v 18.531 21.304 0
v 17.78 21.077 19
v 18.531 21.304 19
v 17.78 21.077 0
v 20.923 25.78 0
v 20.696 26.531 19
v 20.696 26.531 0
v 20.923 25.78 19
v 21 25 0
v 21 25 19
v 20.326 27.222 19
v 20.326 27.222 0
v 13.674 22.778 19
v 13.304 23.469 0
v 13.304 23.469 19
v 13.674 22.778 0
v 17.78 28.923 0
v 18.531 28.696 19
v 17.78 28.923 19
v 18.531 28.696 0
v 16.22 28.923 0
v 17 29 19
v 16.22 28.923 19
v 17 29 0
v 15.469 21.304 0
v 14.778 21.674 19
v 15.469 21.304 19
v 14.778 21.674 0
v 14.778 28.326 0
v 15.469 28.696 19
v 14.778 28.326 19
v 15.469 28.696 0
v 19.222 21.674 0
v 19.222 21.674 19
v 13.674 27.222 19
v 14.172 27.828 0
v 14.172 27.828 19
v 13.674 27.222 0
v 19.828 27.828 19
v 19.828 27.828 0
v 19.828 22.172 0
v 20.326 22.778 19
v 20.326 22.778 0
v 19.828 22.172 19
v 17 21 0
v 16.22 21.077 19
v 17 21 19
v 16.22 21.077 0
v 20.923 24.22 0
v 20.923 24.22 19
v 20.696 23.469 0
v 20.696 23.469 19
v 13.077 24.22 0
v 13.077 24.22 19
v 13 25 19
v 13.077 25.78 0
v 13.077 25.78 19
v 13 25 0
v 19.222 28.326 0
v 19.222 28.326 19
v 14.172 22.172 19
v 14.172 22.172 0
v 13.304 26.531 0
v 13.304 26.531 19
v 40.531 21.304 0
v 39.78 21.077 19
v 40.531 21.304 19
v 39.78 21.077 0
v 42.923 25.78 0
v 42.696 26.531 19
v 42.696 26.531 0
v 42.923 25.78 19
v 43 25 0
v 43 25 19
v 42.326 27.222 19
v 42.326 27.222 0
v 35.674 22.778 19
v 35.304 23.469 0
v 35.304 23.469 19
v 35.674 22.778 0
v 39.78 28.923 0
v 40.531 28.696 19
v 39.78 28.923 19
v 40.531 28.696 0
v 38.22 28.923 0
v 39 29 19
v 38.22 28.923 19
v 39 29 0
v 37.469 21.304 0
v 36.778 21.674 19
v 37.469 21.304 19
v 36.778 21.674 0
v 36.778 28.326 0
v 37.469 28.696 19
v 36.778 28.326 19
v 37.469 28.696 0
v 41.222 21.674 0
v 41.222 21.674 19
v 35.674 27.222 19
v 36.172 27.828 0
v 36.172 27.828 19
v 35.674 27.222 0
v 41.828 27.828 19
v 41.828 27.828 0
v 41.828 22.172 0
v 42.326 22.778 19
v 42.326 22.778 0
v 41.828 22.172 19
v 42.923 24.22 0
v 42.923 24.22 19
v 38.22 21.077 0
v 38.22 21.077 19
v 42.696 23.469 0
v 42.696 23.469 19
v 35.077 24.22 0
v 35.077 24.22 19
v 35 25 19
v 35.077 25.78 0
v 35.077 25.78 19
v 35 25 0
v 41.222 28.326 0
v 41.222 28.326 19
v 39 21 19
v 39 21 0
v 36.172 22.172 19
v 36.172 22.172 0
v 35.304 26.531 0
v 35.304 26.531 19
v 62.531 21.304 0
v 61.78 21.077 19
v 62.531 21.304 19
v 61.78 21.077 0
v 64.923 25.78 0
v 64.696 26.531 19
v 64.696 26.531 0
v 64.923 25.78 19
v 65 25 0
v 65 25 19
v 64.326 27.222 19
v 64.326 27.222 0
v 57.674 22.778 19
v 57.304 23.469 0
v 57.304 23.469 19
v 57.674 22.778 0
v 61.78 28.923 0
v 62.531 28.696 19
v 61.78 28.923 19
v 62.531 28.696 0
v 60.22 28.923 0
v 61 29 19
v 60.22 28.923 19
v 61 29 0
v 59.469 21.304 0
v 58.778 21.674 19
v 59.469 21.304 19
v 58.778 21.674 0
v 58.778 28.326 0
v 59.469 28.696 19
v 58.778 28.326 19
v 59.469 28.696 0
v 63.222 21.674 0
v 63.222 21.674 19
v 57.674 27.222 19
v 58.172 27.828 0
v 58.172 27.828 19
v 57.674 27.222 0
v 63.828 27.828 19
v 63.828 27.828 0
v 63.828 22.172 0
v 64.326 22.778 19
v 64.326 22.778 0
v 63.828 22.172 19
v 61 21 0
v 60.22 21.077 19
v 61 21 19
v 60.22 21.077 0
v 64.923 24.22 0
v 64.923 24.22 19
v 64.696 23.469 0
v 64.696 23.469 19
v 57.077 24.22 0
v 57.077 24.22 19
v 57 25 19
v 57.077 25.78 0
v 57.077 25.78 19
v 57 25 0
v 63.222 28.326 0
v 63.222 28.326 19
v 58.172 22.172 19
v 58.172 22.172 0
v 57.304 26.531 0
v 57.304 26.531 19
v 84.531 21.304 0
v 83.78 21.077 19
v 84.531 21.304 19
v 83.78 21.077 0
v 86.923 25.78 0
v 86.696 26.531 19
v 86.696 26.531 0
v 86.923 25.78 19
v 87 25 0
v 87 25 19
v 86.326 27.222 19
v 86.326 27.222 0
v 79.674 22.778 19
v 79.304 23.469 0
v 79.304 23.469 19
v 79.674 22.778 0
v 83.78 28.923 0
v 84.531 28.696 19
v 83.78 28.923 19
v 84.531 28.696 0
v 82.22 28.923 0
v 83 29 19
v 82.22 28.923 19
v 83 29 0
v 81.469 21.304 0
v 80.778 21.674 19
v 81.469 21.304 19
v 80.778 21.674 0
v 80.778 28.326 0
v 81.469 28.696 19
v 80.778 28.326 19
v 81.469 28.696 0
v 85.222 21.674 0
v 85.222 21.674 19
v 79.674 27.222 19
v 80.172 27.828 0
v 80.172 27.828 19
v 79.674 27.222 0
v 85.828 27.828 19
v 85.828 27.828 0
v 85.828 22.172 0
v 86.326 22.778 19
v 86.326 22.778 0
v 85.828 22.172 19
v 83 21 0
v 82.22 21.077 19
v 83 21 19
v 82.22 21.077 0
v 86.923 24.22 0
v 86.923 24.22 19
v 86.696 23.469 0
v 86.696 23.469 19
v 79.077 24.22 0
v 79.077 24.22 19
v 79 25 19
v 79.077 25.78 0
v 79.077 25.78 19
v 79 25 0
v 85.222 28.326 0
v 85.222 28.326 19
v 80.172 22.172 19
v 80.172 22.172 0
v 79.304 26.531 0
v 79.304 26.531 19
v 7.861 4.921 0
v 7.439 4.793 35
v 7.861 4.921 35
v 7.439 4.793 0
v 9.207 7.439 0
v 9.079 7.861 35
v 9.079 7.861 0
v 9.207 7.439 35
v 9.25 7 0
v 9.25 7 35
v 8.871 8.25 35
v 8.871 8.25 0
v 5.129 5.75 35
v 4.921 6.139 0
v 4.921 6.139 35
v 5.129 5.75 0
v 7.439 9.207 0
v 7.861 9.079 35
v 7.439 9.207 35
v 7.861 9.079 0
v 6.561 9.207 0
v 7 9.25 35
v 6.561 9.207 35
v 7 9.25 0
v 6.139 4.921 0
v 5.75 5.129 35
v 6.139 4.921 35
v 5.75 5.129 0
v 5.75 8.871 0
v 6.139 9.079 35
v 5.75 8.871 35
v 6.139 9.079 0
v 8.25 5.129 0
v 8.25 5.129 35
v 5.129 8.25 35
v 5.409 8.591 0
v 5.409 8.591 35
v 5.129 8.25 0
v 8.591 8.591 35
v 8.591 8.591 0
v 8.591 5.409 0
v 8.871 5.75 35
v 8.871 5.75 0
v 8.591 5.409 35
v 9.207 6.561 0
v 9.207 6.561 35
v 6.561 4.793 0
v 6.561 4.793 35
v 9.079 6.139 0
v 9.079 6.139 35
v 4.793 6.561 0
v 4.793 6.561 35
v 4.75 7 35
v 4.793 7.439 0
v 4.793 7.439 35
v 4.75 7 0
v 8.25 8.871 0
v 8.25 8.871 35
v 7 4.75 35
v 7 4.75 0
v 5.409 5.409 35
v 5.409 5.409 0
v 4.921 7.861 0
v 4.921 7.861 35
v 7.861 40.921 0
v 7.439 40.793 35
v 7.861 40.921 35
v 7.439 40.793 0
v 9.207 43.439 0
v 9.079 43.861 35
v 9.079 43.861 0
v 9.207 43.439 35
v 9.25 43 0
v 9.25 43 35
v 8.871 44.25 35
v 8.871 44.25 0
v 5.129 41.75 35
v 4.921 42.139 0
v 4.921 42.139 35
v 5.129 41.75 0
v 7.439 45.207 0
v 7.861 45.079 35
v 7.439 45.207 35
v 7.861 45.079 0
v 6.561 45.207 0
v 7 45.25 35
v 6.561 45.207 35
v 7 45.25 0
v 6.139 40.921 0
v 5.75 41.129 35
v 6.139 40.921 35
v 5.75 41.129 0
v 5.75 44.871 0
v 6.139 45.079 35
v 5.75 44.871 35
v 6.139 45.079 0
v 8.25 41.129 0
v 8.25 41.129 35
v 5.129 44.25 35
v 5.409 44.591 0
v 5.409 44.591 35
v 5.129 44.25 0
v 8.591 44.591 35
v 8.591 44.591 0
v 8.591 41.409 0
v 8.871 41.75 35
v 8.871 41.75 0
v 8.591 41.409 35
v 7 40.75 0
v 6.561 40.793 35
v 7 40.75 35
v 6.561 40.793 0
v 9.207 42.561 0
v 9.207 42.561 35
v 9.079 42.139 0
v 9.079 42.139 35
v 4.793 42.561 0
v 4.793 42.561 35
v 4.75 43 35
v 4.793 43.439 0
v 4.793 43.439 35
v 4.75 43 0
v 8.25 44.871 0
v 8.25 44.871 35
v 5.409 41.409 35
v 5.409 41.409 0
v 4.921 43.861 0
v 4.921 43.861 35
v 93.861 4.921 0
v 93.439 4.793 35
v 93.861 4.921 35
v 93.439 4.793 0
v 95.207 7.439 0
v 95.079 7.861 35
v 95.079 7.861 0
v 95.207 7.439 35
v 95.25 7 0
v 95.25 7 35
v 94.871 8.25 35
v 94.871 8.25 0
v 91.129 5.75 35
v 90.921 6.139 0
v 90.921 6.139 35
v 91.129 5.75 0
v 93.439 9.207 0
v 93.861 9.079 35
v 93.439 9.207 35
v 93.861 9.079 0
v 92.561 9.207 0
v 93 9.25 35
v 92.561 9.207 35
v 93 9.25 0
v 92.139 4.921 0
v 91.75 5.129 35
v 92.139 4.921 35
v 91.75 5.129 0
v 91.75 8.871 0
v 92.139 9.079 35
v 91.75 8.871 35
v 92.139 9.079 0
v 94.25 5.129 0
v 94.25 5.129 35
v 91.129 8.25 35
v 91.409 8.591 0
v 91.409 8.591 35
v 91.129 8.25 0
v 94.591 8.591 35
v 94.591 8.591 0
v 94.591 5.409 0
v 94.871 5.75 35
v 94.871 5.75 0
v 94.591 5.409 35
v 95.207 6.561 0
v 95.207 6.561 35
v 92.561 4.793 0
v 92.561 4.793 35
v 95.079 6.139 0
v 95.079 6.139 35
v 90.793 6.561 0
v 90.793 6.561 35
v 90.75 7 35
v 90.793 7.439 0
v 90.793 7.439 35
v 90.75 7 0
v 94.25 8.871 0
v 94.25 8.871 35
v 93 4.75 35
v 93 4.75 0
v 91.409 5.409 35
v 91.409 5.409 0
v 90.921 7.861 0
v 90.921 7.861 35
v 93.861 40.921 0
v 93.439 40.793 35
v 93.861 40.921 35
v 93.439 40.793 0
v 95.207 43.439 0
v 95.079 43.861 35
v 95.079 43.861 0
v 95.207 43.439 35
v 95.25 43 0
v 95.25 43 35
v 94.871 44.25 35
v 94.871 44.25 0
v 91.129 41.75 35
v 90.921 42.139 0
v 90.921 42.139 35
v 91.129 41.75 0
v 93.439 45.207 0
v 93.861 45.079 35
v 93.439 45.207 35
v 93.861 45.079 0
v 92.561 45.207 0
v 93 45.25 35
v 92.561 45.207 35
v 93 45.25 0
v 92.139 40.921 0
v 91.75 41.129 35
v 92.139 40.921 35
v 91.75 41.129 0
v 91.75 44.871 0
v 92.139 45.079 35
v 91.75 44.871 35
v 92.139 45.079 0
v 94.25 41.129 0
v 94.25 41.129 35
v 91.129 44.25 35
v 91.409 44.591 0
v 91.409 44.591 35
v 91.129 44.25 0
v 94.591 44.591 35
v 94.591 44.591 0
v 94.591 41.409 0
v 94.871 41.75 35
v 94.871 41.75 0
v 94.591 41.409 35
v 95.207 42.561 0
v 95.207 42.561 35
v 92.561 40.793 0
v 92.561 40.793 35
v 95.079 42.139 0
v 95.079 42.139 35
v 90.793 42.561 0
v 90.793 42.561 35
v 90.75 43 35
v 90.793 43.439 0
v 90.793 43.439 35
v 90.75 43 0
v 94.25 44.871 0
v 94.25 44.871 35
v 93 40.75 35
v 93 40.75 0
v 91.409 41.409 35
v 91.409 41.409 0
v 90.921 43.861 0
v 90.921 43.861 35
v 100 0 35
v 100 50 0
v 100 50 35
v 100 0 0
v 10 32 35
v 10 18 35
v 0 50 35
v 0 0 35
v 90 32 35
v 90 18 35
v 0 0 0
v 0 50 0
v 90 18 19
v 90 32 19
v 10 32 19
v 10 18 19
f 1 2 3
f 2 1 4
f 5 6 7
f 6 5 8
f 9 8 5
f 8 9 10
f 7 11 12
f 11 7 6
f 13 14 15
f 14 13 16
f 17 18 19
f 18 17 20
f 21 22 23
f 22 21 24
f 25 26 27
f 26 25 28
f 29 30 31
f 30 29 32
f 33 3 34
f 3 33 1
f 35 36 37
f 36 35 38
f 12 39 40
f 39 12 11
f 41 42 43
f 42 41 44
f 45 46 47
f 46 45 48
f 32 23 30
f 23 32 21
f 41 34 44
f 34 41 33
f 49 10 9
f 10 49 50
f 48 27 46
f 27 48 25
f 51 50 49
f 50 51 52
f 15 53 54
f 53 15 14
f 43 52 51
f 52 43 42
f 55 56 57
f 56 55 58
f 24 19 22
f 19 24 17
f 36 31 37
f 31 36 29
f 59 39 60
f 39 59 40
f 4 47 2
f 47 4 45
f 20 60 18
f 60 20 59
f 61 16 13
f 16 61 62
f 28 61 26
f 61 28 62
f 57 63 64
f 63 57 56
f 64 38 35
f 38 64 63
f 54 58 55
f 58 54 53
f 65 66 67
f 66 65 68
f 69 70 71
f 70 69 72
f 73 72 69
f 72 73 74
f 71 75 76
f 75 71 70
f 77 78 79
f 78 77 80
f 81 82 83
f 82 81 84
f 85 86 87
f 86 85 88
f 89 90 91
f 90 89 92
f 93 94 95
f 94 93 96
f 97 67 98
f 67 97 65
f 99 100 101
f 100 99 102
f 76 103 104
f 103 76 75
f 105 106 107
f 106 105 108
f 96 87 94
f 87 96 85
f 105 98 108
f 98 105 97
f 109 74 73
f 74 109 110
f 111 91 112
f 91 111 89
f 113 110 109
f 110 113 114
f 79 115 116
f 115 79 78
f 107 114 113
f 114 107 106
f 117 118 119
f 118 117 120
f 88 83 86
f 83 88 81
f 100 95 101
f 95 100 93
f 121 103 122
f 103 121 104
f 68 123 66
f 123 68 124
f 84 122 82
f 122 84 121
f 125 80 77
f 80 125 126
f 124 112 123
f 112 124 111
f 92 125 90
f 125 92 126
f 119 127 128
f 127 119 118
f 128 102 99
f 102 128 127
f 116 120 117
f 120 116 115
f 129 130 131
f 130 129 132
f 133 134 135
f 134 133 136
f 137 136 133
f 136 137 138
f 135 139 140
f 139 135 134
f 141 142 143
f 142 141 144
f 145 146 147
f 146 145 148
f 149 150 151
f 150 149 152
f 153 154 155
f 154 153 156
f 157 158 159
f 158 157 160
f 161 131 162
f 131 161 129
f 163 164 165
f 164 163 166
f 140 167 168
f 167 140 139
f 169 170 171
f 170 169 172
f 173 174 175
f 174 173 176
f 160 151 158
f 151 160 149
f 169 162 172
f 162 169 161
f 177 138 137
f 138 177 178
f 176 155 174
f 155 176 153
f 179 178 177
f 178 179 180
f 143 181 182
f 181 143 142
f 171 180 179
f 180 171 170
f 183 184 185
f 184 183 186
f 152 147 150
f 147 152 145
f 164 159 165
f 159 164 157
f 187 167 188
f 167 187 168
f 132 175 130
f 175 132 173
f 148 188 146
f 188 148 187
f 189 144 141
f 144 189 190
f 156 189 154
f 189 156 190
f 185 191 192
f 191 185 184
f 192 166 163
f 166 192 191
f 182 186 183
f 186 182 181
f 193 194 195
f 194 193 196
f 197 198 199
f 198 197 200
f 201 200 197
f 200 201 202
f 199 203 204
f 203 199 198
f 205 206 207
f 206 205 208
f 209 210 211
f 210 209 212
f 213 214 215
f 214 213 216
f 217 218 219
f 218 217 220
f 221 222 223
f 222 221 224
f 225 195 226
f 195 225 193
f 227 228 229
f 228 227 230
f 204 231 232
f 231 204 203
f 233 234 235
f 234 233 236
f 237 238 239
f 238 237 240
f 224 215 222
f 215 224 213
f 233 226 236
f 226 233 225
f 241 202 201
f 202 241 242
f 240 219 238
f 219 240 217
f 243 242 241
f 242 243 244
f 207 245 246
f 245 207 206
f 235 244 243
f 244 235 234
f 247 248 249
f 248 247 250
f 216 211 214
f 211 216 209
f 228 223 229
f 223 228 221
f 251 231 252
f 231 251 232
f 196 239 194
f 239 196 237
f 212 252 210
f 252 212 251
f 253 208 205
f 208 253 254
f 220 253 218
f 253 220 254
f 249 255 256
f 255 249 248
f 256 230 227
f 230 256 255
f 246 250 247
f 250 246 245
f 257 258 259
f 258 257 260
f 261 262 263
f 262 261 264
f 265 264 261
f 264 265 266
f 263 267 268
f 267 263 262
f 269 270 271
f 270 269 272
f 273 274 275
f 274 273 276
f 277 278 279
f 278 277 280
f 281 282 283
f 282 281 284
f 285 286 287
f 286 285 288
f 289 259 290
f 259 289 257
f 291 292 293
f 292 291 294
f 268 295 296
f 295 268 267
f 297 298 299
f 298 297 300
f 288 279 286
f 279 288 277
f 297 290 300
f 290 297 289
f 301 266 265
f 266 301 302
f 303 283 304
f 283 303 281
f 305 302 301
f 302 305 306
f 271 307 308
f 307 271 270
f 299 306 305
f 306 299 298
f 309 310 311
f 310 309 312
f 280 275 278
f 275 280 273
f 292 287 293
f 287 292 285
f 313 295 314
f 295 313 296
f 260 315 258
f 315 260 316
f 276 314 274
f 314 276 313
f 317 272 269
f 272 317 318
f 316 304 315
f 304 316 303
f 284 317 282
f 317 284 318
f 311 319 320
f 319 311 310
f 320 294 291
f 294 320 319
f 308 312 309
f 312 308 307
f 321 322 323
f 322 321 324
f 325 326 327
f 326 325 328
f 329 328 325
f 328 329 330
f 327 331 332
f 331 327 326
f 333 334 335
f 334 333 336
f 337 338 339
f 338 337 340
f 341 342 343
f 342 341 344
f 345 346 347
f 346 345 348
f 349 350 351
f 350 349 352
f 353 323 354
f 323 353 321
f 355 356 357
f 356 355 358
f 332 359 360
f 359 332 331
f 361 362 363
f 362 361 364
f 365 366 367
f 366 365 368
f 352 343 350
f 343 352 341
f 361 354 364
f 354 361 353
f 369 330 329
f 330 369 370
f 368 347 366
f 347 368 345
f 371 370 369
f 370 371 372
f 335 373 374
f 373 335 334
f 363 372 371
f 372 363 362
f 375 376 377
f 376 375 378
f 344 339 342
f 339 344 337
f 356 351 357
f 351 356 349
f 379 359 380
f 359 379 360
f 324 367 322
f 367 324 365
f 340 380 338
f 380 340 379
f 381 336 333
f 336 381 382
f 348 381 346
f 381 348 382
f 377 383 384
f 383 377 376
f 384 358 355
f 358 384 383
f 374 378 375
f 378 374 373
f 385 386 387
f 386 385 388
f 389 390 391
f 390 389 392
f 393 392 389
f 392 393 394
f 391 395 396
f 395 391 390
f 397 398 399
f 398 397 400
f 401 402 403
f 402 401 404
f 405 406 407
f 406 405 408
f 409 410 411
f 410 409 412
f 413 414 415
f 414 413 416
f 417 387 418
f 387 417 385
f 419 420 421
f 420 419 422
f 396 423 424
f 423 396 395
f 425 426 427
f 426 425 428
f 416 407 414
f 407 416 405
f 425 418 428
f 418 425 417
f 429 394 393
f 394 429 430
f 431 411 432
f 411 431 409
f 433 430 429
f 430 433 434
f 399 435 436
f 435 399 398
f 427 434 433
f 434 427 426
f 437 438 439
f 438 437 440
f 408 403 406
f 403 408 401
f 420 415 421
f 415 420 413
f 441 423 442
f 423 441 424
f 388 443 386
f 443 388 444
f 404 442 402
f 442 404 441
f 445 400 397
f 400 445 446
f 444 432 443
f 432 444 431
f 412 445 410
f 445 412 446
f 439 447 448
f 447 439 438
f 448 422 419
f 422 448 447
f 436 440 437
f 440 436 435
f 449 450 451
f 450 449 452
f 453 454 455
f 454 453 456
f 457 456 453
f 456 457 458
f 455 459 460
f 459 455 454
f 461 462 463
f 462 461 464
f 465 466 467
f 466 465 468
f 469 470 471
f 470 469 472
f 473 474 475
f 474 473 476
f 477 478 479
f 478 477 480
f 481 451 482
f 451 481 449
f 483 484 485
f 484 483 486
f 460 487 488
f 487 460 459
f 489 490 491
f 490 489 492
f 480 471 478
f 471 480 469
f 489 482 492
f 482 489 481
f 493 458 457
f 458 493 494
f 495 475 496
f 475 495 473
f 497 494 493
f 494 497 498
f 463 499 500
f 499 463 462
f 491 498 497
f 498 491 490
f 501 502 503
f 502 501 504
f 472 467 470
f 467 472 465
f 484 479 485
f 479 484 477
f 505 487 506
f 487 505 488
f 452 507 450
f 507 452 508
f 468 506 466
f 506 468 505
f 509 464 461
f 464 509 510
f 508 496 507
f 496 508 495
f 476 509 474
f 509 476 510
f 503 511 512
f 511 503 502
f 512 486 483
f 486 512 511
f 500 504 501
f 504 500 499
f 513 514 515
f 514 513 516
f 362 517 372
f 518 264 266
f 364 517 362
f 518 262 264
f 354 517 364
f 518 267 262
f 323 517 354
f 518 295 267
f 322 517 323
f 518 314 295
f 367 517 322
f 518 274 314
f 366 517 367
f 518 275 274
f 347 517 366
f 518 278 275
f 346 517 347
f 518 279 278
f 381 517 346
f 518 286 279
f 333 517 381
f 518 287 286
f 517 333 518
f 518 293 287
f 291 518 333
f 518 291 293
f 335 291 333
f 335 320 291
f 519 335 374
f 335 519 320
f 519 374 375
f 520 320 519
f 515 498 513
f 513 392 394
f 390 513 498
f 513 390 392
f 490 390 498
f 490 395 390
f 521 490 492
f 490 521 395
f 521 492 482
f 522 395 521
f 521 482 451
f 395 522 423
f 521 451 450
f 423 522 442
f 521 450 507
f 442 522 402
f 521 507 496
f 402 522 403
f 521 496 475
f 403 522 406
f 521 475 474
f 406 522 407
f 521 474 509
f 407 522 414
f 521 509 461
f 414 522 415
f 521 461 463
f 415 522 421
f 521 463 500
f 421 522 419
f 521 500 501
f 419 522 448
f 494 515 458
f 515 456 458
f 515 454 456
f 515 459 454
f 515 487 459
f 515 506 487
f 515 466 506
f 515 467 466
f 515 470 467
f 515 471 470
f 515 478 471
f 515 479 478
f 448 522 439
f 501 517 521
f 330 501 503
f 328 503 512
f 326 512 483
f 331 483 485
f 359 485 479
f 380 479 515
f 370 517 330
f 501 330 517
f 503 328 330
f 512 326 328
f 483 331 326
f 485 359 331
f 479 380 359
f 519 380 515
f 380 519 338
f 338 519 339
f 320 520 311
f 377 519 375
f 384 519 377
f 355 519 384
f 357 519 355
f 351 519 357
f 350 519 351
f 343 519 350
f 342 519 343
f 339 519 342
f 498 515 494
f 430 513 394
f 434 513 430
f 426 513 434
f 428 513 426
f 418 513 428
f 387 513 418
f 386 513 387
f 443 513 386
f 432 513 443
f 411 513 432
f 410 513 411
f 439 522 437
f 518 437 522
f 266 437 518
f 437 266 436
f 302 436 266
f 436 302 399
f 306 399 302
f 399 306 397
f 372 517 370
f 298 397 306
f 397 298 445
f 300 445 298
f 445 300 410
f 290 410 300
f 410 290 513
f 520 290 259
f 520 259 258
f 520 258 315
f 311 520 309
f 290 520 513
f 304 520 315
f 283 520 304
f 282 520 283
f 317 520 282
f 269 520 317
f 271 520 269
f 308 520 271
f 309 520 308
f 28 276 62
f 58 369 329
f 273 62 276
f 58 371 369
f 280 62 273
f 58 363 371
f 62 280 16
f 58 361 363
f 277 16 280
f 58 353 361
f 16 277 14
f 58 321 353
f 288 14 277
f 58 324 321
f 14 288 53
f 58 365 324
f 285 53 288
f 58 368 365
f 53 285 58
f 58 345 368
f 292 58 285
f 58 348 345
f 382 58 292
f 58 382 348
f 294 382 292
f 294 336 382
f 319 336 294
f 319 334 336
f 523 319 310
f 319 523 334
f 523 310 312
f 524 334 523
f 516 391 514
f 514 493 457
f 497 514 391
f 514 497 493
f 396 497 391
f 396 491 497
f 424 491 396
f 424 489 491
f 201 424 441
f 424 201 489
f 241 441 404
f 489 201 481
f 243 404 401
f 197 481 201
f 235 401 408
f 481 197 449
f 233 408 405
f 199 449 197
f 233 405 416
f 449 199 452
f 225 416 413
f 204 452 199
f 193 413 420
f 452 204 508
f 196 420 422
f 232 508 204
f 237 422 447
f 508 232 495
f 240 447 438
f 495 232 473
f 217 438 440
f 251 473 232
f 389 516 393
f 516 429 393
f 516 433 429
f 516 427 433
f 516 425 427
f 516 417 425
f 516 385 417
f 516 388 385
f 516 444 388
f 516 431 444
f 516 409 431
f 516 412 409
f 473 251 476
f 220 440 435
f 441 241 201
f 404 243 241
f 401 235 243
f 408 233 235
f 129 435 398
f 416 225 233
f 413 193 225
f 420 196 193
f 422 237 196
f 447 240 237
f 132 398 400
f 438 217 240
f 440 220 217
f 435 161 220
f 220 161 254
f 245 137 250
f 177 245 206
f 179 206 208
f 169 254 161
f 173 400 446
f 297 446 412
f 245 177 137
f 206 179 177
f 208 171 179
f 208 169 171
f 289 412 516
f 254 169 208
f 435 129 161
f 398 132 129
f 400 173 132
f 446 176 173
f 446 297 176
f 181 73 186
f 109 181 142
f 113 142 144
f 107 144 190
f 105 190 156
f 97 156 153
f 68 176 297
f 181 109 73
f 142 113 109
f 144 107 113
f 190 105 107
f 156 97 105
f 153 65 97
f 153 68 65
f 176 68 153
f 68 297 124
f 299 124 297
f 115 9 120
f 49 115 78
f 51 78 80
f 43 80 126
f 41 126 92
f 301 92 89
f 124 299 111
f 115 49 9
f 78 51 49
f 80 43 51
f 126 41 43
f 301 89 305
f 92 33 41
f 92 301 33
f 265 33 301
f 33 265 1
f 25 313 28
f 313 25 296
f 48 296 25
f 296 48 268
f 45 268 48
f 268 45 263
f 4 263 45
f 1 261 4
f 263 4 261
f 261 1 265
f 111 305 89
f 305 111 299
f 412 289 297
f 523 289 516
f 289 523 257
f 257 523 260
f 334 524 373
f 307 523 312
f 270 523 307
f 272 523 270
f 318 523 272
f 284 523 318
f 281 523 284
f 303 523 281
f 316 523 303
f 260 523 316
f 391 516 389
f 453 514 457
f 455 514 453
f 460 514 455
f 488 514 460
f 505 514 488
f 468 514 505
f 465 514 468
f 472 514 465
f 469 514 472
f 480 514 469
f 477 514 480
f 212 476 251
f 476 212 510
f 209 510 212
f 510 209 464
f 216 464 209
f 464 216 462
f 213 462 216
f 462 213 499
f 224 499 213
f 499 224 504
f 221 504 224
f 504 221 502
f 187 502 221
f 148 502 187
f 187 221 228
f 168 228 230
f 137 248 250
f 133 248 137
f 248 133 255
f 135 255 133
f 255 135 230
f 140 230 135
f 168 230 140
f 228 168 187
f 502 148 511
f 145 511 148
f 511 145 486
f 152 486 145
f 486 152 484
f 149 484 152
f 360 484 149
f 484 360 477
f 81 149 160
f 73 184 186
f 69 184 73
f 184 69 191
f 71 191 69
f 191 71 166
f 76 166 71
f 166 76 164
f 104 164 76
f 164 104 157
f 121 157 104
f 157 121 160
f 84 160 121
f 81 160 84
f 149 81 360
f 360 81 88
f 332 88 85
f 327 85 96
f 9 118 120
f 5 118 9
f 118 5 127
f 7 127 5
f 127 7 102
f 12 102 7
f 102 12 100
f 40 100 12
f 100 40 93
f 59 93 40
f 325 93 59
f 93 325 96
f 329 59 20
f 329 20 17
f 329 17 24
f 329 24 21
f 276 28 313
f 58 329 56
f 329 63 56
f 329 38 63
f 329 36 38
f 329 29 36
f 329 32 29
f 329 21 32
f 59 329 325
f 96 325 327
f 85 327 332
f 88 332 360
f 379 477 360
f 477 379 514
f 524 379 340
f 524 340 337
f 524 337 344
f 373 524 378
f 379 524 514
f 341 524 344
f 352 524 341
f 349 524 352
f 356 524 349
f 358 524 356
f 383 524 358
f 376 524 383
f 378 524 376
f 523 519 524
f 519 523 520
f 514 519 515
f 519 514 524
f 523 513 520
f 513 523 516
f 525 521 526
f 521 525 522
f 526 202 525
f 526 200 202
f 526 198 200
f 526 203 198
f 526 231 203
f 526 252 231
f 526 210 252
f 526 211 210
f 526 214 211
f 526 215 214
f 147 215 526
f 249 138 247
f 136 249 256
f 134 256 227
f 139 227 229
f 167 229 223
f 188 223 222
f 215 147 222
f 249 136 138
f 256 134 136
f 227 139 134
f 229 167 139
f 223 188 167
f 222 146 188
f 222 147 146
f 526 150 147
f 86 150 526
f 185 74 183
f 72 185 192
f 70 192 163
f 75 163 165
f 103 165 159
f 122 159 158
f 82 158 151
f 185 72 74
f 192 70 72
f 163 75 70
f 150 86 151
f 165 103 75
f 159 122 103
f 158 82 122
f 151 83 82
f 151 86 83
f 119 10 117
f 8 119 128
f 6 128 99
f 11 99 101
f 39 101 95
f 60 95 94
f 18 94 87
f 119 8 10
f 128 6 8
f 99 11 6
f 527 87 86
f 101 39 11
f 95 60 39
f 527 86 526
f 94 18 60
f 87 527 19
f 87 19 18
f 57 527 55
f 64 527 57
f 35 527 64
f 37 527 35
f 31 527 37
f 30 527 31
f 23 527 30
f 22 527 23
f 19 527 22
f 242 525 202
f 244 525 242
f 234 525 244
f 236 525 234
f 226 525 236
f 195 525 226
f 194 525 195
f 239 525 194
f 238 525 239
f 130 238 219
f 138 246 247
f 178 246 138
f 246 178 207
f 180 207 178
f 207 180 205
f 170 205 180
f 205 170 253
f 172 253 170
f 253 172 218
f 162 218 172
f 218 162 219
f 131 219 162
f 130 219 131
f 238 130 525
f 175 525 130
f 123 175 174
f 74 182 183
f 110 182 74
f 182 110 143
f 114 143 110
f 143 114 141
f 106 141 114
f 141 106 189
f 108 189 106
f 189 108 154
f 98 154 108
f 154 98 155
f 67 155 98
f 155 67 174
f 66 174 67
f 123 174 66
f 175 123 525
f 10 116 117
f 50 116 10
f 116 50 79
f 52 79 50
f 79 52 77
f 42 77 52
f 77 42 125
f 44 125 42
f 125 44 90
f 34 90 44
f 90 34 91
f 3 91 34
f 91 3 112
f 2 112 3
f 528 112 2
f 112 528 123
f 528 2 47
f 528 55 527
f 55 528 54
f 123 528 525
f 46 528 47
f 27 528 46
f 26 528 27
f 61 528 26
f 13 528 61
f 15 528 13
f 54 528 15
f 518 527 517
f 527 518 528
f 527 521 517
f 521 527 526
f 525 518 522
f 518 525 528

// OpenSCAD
$fn = 32;

// ----------------------------------------------------------------------
// Manifold block: gallery_top manifold
// ----------------------------------------------------------------------

// --- parameters (mm) ---
block_l = 100;            // block length, X
block_w = 50;             // block width, Y
block_h = 35;             // block height, Z
port_d = 8;               // port bore diameter
port_pitch = 22;          // port pitch along X
gallery_d = 14;           // top gallery width, Y
gallery_depth = 16;       // gallery pocket depth
wall_p = 10;              // gallery end wall thickness, X
mnt_d = 4.5;              // mounting hole diameter
mnt_in = 7;               // mounting hole inset from the edges
fit_tol = 0.05;           // tolerance for press fits, mm
free_tol = 0.3;           // tolerance for clearance fits, mm

n_ports = 4;  // ports in the row
port_x0 = (block_l - (n_ports - 1) * port_pitch) / 2;  // first port X

difference() {
  cube([block_l, block_w, block_h]);
  for (i = [0 : n_ports - 1])
    translate([port_x0 + i * port_pitch, block_w / 2, -1])
      cylinder(h = block_h + 2, d = port_d);
  translate([wall_p, block_w / 2 - gallery_d / 2, block_h - gallery_depth])
    cube([block_l - 2 * wall_p, gallery_d, gallery_depth + 1]);
  for (cx = [mnt_in, block_l - mnt_in])
    for (cy = [mnt_in, block_w - mnt_in])
      translate([cx, cy, -1]) cylinder(h = block_h + 2, d = mnt_d);
}
